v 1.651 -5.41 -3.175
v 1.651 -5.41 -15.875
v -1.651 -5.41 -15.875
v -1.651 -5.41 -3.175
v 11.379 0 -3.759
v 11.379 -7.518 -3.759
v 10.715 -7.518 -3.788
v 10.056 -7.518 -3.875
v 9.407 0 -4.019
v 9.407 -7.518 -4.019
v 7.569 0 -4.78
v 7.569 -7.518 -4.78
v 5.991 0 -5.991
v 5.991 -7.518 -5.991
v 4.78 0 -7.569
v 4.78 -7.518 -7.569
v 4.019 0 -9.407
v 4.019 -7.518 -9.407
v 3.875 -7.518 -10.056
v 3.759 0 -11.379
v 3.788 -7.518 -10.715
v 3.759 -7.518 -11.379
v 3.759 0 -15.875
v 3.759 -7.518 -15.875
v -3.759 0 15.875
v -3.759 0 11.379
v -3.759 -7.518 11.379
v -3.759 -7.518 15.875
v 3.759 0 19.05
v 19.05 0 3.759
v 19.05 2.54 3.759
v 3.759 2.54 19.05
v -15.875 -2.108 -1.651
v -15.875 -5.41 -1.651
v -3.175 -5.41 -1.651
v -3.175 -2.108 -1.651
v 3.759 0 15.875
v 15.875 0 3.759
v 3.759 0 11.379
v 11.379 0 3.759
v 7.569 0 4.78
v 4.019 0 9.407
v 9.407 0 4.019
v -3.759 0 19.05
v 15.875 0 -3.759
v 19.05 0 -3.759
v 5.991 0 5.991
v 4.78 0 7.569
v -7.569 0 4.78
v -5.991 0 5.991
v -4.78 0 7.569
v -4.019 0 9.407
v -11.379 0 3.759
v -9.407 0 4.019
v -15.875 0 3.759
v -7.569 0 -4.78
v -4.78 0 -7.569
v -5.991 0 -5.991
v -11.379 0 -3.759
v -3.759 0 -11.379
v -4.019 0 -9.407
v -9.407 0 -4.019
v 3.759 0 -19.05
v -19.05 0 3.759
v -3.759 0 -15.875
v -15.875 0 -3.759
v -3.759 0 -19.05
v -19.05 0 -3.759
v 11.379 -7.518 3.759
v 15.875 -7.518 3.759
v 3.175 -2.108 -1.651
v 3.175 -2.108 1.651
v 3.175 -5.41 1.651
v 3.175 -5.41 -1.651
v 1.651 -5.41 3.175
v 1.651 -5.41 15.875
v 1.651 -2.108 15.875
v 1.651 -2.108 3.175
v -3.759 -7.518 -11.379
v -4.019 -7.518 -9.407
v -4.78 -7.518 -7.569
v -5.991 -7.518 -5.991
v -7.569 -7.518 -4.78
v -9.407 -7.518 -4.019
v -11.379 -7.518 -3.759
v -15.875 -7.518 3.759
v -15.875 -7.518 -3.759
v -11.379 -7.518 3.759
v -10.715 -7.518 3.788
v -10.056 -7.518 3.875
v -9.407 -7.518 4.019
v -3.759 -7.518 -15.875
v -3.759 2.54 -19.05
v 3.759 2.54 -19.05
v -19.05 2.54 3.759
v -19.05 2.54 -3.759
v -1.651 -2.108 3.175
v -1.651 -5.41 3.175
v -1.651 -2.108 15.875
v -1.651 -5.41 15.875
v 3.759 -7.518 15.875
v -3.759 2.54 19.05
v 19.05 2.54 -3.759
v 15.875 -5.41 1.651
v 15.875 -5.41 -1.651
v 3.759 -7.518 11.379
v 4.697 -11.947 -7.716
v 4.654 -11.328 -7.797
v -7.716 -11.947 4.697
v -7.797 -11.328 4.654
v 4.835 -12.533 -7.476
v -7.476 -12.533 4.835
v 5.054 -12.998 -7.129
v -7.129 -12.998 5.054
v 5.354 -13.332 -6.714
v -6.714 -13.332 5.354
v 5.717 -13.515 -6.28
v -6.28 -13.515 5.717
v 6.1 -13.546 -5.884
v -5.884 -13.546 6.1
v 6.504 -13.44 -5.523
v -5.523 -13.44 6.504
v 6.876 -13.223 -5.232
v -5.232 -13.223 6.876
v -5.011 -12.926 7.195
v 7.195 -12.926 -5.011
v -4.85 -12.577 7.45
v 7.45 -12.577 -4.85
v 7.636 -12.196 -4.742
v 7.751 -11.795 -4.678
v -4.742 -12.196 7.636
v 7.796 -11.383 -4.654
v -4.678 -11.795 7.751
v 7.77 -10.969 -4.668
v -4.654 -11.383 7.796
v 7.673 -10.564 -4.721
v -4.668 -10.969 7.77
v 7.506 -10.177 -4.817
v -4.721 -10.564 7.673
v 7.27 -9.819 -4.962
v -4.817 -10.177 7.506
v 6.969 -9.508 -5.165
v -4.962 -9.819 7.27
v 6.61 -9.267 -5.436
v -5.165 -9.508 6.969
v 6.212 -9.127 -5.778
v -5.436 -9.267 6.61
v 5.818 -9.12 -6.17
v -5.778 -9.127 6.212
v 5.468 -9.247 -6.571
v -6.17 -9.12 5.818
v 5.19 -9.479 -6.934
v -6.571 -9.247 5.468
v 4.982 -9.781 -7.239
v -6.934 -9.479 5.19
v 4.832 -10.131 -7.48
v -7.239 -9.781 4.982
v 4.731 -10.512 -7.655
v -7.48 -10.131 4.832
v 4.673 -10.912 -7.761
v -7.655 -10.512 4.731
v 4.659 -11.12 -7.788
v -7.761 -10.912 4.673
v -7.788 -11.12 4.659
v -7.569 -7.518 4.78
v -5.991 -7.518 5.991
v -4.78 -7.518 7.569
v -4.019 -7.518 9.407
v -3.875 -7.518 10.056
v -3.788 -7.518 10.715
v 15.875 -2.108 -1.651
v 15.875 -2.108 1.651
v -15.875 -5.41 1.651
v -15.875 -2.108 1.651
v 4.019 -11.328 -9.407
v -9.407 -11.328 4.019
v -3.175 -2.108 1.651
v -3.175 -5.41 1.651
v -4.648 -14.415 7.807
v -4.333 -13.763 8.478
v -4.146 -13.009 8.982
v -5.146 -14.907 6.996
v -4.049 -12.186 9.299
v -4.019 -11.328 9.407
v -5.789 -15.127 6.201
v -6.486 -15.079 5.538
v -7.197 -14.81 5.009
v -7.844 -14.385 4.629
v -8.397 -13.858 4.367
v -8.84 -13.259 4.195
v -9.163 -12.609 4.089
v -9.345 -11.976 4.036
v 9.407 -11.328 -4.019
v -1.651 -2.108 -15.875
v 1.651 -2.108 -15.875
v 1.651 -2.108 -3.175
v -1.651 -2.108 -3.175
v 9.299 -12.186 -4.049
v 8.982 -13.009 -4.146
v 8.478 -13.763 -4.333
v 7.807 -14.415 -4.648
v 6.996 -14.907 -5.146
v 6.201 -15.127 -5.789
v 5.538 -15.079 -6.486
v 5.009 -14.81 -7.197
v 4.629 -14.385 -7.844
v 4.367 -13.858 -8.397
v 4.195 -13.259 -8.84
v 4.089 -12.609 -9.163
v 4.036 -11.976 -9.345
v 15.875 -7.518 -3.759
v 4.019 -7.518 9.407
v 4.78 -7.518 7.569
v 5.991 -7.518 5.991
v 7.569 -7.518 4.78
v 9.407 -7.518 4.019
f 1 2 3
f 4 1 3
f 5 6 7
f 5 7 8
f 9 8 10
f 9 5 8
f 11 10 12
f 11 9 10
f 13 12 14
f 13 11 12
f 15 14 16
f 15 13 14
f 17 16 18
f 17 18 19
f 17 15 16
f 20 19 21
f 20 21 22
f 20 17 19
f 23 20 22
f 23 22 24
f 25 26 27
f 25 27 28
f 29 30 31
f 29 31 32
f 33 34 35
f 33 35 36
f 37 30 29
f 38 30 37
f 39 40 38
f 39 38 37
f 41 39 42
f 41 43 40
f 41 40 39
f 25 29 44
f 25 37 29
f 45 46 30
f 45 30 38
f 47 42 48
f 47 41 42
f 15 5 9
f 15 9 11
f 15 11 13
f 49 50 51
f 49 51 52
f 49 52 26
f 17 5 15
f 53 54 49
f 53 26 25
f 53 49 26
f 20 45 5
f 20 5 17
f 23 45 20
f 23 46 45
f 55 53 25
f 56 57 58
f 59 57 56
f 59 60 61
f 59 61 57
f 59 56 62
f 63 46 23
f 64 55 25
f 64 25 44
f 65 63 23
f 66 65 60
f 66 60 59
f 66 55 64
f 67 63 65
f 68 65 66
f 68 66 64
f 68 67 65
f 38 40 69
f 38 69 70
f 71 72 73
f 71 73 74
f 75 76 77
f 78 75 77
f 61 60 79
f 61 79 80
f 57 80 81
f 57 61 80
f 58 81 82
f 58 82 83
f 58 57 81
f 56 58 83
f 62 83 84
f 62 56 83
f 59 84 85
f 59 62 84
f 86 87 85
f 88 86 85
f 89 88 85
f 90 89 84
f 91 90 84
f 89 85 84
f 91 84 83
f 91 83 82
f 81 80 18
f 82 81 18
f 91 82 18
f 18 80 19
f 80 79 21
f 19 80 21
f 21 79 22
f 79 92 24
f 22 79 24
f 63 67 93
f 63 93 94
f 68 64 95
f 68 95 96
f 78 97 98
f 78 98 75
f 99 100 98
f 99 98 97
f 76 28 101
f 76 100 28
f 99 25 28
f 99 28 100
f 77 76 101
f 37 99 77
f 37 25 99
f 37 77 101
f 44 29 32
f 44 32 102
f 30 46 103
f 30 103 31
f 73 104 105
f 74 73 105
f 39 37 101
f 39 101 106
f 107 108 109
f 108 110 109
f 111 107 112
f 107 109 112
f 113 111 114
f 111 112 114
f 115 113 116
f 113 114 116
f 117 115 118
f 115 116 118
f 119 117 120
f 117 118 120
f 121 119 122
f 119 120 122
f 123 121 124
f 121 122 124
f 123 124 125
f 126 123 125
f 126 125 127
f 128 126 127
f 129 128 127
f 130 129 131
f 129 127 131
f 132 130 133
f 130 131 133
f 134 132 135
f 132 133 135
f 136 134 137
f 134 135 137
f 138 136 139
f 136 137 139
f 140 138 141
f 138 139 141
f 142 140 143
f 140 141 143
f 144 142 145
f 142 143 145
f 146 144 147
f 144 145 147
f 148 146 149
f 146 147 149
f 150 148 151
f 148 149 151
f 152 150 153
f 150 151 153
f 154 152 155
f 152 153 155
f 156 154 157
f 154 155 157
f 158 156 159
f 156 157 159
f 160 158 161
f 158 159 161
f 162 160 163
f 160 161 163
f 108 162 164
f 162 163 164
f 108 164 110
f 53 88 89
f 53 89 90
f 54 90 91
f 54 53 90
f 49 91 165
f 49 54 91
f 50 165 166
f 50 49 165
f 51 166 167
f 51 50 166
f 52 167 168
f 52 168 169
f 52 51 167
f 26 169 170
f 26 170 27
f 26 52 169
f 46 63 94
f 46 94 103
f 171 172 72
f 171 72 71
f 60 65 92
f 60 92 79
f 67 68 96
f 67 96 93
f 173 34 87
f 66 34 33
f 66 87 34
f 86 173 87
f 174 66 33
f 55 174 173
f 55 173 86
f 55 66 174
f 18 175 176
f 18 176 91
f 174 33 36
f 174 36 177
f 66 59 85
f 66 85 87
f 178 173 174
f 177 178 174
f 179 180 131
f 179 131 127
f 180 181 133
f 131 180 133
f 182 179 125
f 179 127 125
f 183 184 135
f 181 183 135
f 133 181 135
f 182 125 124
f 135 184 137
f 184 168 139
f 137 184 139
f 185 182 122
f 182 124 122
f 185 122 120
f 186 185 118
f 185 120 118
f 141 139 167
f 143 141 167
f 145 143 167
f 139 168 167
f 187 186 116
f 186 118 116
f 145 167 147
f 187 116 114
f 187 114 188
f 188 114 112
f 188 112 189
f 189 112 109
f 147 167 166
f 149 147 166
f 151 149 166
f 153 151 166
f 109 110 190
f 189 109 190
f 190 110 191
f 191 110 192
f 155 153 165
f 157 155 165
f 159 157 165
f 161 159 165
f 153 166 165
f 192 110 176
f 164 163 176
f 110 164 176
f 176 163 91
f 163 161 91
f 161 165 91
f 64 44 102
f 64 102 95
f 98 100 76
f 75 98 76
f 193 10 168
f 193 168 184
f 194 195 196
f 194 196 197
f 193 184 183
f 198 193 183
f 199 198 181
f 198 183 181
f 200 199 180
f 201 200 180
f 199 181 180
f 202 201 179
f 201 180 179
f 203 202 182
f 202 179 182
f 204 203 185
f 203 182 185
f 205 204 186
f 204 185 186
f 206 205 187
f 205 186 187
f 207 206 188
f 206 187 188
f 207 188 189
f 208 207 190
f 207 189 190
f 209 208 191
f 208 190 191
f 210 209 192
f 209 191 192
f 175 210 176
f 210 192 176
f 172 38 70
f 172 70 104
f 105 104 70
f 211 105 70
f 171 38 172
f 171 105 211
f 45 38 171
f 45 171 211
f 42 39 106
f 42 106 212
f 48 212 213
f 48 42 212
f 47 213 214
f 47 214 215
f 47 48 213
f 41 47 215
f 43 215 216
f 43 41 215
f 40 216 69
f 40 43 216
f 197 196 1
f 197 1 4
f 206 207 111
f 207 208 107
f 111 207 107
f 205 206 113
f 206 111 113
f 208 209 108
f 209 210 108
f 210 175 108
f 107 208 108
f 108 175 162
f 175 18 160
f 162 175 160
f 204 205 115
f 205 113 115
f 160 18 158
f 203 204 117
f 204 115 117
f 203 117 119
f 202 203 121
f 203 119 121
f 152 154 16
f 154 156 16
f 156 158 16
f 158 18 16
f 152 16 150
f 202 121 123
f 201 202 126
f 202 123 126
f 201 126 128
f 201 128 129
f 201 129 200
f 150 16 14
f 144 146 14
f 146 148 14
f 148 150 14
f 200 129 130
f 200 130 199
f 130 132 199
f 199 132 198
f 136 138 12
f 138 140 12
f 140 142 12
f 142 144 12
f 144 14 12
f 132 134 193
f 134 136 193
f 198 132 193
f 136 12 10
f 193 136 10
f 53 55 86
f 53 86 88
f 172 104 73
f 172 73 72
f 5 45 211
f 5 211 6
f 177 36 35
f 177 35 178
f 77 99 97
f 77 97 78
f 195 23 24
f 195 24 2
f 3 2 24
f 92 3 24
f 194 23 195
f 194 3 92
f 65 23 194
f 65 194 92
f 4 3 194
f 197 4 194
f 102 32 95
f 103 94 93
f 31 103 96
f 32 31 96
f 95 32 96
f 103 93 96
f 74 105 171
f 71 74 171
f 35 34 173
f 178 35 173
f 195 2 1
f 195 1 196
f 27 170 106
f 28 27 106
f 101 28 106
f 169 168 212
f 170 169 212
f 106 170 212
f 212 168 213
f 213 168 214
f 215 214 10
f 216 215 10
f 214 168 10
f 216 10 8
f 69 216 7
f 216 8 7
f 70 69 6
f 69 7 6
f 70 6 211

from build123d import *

# Parameters (mm, degrees)
BOSS_EXTRUDE1_DEPTH                  = 7.5184
SKETCH2_W                            = 3.302
SKETCH2_H                            = 3.302
CUT_EXTRUDE1_DEPTH                   = 12.7
CIRPATTERN1_COUNT                    = 4
BOSS_EXTRUDE2_DEPTH                  = 2.54
BOSS_EXTRUDE3_REACH                  = 29.97
BOSS_EXTRUDE3_END_RADIUS             = 7.62
SKETCH6_R                            = 2.2225
BOSS_EXTRUDE3_DIRECTION_2_REACH      = 29.97
BOSS_EXTRUDE3_DIRECTION_2_END_RADIUS = 7.62


with BuildPart() as part:
    # Sketch1 → Boss-Extrude1 (new body)
    with BuildSketch(Plane(origin=(0, 0, 0), x_dir=(1, 0, 0), z_dir=(0, 1, 0))):
        with BuildLine():
            Line((3.7592, 11.3792), (3.7592, 15.875))
            Line((3.7592, 15.875), (-3.7592, 15.875))
            Line((-3.7592, 15.875), (-3.7592, 11.3792))
            ThreePointArc((-3.7592, 11.3792), (-5.991046327, 5.991046327), (-11.3792, 3.7592))
            Line((-11.3792, 3.7592), (-15.875, 3.7592))
            Line((-15.875, 3.7592), (-15.875, -3.7592))
            Line((-15.875, -3.7592), (-11.3792, -3.7592))
            ThreePointArc((-11.3792, -3.7592), (-5.991046327, -5.991046327), (-3.7592, -11.3792))
            Line((-3.7592, -11.3792), (-3.7592, -15.875))
            Line((-3.7592, -15.875), (3.7592, -15.875))
            Line((3.7592, -15.875), (3.7592, -11.3792))
            ThreePointArc((3.7592, -11.3792), (5.991046327, -5.991046327), (11.3792, -3.7592))
            Line((11.3792, -3.7592), (15.875, -3.7592))
            Line((15.875, -3.7592), (15.875, 3.7592))
            Line((15.875, 3.7592), (11.3792, 3.7592))
            ThreePointArc((11.3792, 3.7592), (5.991046327, 5.991046327), (3.7592, 11.3792))
        make_face()
    extrude(amount=-BOSS_EXTRUDE1_DEPTH)

    # Sketch2 → Cut-Extrude1 (cut)
    with BuildSketch(Plane.XY.offset(15.875)):
        with Locations((0, -3.7592)):
            Rectangle(SKETCH2_W, SKETCH2_H)
    cut_extrude1 = extrude(amount=-CUT_EXTRUDE1_DEPTH, mode=Mode.SUBTRACT)

    # CirPattern1: Cut-Extrude1 ×4 about axis
    cirpattern1_axis = Axis((0, -22.390859054, 0), (0, 1, 0))
    for i in range(1, CIRPATTERN1_COUNT):
        add(cut_extrude1.rotate(cirpattern1_axis, i * 360 / CIRPATTERN1_COUNT), mode=Mode.SUBTRACT)

    # Sketch4 → Boss-Extrude2 (add)
    with BuildSketch(Plane(origin=(0, 0, 0), x_dir=(1, 0, 0), z_dir=(0, 1, 0))):
        Polygon((3.7592, 19.05), (19.05, 3.7592), (19.05, -3.7592), (3.7592, -19.05), (-3.7592, -19.05), (-19.05, -3.7592), (-19.05, 3.7592), (-3.7592, 19.05), align=None)
    extrude(amount=BOSS_EXTRUDE2_DEPTH)

    # Boss-Extrude3: up to this cylinder (the profile starts outside it)
    boss_extrude3_end = Plane(origin=(-11.3792, -9.4234, 11.3792), z_dir=(0, 1, 0)) * Cylinder(BOSS_EXTRUDE3_END_RADIUS, 76.18, mode=Mode.PRIVATE)
    # Sketch6 → Boss-Extrude3 (add, up to the surface)
    with BuildSketch(Plane(origin=(0, 0, 0), x_dir=(0.7071067811865474, 0, 0.7071067811865477), z_dir=(-0.7071067811865477, 0, 0.7071067811865474)), mode=Mode.PRIVATE) as boss_extrude3_sk1:
        with BuildLine():
            Line((-3.81, -11.3284), (-3.81, -7.5184))
            Line((-3.81, -7.5184), (3.81, -7.5184))
            Line((3.81, -7.5184), (3.81, -11.3284))
            ThreePointArc((3.81, -11.3284), (0, -15.1384), (-3.81, -11.3284))
        make_face()
        with Locations((0, -11.3284)):
            Circle(SKETCH6_R, mode=Mode.SUBTRACT)
    boss_extrude3_tool1 = extrude(boss_extrude3_sk1.sketch, amount=BOSS_EXTRUDE3_REACH, mode=Mode.PRIVATE) - boss_extrude3_end
    add(boss_extrude3_tool1.solids().sort_by_distance((-2.617877, -9.4234, -2.617877))[0])

    # Boss-Extrude3 direction 2: up to this cylinder (the profile starts outside it)
    boss_extrude3_direction_2_end = Plane(origin=(11.3792, -9.4234, -11.3792), z_dir=(0, 1, 0)) * Cylinder(BOSS_EXTRUDE3_DIRECTION_2_END_RADIUS, 76.18, mode=Mode.PRIVATE)
    # Sketch6 → Boss-Extrude3 direction 2 (add, up to the surface)
    with BuildSketch(Plane(origin=(0, 0, 0), x_dir=(0.7071067811865474, 0, 0.7071067811865477), z_dir=(-0.7071067811865477, 0, 0.7071067811865474)), mode=Mode.PRIVATE) as boss_extrude3_direction_2_sk1:
        with BuildLine():
            Line((-3.81, -11.3284), (-3.81, -7.5184))
            Line((-3.81, -7.5184), (3.81, -7.5184))
            Line((3.81, -7.5184), (3.81, -11.3284))
            ThreePointArc((3.81, -11.3284), (0, -15.1384), (-3.81, -11.3284))
        make_face()
        with Locations((0, -11.3284)):
            Circle(SKETCH6_R, mode=Mode.SUBTRACT)
    boss_extrude3_direction_2_tool1 = extrude(boss_extrude3_direction_2_sk1.sketch, amount=-BOSS_EXTRUDE3_DIRECTION_2_REACH, mode=Mode.PRIVATE) - boss_extrude3_direction_2_end
    add(boss_extrude3_direction_2_tool1.solids().sort_by_distance((-2.617877, -9.4234, -2.617877))[0])


solid = part.part
